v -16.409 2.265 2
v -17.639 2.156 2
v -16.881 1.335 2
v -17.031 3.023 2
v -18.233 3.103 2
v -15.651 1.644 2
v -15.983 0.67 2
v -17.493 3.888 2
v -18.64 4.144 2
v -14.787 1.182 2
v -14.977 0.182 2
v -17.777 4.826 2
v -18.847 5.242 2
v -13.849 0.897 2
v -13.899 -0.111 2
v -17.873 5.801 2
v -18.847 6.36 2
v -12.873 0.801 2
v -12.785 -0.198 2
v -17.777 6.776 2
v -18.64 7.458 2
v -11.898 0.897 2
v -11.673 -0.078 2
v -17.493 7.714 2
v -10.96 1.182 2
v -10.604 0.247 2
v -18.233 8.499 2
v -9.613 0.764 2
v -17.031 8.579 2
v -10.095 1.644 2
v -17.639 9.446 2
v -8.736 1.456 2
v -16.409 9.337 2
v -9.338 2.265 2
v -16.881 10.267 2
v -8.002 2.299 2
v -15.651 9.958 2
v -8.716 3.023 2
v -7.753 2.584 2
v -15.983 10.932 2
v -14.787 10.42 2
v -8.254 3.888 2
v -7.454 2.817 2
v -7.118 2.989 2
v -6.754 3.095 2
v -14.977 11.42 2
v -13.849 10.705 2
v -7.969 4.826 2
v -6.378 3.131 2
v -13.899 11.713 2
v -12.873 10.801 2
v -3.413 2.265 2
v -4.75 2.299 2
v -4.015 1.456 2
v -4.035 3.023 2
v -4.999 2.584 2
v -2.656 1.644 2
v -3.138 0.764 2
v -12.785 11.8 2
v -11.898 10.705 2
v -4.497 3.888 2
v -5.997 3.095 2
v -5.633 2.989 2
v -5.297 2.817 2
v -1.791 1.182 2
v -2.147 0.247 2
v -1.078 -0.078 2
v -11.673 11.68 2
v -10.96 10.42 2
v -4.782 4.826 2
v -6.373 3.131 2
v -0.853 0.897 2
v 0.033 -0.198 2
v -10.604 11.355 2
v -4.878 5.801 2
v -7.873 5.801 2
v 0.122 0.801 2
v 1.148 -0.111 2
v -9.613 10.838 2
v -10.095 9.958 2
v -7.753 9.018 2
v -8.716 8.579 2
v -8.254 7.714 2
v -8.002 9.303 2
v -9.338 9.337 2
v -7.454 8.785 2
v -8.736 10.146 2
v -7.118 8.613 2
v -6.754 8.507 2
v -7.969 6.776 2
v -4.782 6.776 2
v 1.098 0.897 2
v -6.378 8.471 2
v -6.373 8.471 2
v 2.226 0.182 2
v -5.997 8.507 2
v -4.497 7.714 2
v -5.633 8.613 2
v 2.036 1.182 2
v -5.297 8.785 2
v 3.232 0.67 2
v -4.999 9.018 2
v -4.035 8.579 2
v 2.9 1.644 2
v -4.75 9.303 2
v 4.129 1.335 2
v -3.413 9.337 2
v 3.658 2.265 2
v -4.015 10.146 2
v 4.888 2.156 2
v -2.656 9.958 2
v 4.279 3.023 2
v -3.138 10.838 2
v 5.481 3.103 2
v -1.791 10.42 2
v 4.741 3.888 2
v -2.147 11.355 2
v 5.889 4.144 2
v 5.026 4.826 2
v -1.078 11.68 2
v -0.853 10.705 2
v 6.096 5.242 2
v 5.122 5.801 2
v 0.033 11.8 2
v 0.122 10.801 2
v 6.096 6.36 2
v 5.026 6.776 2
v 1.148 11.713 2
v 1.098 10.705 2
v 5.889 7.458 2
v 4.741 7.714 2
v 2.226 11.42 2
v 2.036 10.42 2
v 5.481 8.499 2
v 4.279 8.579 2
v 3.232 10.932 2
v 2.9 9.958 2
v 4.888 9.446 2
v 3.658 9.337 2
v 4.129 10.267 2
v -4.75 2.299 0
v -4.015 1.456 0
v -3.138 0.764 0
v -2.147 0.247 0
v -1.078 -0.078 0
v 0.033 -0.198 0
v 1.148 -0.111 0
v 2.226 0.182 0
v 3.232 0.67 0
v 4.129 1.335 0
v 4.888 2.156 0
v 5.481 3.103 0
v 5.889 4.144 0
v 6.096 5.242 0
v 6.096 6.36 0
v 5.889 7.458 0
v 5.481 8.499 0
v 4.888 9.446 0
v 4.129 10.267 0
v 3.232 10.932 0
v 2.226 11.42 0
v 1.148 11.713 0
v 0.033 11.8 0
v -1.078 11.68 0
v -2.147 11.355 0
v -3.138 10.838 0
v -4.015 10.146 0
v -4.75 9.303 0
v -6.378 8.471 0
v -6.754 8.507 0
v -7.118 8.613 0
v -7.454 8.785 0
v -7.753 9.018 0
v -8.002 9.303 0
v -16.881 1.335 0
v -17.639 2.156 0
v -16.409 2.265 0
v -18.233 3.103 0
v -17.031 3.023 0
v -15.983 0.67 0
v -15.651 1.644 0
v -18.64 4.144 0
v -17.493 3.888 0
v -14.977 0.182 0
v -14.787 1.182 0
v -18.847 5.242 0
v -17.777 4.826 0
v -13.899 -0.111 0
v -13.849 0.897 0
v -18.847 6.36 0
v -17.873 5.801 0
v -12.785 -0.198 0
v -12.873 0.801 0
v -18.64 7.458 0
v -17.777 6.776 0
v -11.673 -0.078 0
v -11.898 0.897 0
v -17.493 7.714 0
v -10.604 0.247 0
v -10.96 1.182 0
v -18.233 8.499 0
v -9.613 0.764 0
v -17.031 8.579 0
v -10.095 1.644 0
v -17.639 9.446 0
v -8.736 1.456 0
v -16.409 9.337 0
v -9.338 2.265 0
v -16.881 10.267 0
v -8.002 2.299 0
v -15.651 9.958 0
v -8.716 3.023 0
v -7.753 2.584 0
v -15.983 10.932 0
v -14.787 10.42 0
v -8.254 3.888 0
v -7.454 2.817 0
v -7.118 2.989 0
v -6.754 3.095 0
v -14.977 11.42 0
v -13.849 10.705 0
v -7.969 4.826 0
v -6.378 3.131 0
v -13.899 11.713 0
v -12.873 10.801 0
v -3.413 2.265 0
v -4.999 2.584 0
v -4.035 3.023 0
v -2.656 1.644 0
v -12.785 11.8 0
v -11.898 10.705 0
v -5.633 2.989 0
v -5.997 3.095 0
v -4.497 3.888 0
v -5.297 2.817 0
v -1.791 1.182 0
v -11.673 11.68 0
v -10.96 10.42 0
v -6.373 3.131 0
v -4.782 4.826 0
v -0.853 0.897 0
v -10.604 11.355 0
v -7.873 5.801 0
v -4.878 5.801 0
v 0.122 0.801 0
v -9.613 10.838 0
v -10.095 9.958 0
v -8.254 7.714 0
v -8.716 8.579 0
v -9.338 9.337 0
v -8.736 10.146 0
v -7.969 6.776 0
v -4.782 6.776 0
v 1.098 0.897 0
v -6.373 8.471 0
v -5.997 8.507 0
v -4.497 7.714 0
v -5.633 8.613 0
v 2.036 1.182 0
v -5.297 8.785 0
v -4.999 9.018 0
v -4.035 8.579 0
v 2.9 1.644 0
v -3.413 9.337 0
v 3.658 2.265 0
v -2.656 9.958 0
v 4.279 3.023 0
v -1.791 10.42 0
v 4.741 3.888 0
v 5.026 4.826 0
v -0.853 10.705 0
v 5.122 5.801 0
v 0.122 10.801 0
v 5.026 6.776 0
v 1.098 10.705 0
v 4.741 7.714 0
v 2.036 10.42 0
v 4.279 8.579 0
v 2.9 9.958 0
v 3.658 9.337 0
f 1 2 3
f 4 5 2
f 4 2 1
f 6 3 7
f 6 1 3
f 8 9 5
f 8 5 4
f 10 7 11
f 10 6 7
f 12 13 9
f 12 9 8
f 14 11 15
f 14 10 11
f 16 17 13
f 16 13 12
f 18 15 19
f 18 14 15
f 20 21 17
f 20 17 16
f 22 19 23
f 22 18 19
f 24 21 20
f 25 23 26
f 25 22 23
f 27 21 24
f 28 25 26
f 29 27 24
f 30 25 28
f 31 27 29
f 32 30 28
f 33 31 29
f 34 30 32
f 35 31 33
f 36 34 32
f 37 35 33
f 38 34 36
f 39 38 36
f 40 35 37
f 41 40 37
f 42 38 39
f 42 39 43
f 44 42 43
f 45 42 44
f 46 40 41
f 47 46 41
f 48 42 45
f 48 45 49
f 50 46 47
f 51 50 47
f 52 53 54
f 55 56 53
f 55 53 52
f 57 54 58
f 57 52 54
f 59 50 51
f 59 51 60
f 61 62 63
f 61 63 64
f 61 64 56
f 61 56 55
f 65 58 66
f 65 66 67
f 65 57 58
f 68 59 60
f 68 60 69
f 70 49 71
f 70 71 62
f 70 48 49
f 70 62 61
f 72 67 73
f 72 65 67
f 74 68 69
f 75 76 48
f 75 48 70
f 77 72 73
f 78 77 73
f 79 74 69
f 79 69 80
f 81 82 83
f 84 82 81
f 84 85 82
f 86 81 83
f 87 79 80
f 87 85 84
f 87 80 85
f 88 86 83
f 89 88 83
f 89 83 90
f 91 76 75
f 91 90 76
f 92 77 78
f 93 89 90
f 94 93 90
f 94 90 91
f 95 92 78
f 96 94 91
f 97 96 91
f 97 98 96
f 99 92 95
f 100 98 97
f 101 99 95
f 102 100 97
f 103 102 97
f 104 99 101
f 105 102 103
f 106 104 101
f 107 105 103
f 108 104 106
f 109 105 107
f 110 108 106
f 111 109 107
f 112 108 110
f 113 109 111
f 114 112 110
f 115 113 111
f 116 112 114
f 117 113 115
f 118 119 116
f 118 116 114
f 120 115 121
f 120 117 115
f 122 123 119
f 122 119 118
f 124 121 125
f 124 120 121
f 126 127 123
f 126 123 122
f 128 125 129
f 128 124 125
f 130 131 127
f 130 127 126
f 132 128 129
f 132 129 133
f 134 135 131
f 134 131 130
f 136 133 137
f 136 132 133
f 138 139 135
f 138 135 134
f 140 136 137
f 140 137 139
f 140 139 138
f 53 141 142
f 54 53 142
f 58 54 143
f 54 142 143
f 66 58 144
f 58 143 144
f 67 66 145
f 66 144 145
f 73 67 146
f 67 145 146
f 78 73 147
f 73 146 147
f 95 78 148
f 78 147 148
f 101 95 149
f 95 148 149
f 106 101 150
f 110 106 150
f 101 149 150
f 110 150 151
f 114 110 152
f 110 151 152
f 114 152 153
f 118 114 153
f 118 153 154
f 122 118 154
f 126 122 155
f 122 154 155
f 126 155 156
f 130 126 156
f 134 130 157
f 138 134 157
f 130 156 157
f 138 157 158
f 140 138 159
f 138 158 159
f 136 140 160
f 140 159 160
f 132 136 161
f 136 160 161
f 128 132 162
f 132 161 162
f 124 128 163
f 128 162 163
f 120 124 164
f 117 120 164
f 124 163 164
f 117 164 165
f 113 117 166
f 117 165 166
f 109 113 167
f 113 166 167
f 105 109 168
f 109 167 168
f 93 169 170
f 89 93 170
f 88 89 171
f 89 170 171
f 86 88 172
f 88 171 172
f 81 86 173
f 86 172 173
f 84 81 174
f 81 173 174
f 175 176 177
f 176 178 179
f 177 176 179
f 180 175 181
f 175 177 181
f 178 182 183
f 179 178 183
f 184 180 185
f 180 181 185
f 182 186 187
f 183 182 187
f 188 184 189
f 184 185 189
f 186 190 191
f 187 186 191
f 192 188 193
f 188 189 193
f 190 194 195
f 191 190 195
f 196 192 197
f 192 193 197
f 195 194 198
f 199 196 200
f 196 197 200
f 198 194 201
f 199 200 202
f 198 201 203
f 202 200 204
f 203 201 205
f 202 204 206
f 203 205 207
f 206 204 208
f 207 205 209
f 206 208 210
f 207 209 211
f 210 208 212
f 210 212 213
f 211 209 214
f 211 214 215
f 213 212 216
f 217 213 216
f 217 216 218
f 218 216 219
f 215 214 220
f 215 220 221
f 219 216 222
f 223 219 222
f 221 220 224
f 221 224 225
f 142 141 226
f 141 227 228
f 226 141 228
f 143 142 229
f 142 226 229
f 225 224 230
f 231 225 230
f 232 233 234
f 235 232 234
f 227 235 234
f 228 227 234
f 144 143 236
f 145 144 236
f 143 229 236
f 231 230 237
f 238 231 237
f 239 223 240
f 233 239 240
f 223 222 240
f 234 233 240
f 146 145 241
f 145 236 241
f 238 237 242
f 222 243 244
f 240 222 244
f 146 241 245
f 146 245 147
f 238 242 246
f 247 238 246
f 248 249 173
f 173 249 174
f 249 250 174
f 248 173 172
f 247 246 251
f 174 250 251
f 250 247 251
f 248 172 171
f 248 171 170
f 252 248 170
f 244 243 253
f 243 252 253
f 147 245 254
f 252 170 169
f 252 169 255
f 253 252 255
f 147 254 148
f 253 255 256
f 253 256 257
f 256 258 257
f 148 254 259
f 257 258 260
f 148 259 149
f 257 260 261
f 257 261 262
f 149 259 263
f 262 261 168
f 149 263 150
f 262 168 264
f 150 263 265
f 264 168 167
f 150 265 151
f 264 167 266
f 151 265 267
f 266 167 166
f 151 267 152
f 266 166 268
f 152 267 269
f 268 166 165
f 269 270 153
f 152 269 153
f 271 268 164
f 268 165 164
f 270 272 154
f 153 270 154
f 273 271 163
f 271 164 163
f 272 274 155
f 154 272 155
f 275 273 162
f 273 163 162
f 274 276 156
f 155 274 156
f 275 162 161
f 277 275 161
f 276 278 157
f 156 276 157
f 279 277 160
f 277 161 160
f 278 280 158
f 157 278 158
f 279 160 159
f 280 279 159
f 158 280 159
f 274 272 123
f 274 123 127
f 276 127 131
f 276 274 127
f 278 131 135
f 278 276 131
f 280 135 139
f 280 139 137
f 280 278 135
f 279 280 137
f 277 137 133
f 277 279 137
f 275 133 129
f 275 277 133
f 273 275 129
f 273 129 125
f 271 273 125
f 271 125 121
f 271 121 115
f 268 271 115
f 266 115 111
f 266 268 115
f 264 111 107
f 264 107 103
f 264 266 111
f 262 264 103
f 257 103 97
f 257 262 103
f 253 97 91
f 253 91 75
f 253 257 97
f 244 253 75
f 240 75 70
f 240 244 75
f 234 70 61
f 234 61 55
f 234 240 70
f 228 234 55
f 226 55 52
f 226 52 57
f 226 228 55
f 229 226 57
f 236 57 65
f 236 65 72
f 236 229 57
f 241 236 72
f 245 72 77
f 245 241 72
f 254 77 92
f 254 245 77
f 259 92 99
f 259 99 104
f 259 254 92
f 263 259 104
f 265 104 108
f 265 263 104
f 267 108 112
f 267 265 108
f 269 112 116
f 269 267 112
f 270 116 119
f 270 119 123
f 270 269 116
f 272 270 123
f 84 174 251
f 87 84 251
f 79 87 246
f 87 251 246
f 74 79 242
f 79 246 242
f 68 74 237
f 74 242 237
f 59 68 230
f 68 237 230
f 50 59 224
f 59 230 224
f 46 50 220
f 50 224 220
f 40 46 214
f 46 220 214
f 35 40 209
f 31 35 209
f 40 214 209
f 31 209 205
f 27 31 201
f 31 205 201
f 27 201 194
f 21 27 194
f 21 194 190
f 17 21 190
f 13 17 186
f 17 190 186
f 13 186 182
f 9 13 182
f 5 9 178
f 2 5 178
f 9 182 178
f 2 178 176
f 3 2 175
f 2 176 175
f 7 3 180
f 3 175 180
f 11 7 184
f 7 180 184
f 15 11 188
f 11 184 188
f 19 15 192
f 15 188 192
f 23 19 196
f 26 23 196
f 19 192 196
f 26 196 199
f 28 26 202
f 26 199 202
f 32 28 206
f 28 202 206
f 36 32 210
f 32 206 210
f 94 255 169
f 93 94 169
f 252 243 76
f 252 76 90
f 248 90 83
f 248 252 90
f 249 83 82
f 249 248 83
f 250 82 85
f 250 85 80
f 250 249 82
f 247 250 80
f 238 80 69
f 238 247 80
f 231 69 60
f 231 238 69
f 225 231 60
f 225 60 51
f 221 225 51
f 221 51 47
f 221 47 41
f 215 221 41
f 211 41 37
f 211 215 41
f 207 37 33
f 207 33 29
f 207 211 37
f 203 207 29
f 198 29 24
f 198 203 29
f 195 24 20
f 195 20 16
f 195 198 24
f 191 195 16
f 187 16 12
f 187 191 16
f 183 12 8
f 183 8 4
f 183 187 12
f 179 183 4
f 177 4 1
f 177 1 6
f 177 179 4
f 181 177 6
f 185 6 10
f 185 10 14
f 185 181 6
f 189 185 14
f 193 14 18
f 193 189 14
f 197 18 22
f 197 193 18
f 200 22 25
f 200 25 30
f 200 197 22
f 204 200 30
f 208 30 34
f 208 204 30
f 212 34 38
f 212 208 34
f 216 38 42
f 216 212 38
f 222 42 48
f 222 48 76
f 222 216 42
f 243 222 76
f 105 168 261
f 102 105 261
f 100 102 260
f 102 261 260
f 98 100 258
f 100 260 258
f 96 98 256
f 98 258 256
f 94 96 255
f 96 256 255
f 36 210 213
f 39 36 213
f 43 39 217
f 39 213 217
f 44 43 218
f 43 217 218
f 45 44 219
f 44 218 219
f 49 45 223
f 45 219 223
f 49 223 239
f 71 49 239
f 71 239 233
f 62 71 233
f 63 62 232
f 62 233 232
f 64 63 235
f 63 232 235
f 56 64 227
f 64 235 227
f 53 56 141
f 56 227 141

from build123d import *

# Parameters (mm, degrees)
F0_R     = 5
F1_DEPTH = 2


with BuildPart() as f1:
    # F0 (on Top) → F1 (new body)
    with BuildSketch(Plane.XY):
        with BuildLine():
            ThreePointArc((-6.377694, 8.470873), (-7.290122, 8.691133), (-8.001579, 9.303398))
            ThreePointArc((-8.001579, 9.303398), (-18.873232, 5.800971), (-8.001579, 2.298544))
            ThreePointArc((-8.001579, 2.298544), (-7.290122, 2.910809), (-6.377694, 3.131069))
            Line((-6.377694, 3.131069), (-6.373447, 3.131069))
            ThreePointArc((-6.373447, 3.131069), (-5.461019, 2.910809), (-4.749562, 2.298544))
            ThreePointArc((-4.749562, 2.298544), (6.122091, 5.800971), (-4.749562, 9.303398))
            ThreePointArc((-4.749562, 9.303398), (-5.461019, 8.691133), (-6.373447, 8.470873))
            Line((-6.373447, 8.470873), (-6.377694, 8.470873))
        make_face()
        with Locations((-12.873232, 5.800971)):
            Circle(F0_R, mode=Mode.SUBTRACT)
        with Locations((0.122091, 5.800971)):
            Circle(F0_R, mode=Mode.SUBTRACT)
    extrude(amount=F1_DEPTH)


solid = f1.part
